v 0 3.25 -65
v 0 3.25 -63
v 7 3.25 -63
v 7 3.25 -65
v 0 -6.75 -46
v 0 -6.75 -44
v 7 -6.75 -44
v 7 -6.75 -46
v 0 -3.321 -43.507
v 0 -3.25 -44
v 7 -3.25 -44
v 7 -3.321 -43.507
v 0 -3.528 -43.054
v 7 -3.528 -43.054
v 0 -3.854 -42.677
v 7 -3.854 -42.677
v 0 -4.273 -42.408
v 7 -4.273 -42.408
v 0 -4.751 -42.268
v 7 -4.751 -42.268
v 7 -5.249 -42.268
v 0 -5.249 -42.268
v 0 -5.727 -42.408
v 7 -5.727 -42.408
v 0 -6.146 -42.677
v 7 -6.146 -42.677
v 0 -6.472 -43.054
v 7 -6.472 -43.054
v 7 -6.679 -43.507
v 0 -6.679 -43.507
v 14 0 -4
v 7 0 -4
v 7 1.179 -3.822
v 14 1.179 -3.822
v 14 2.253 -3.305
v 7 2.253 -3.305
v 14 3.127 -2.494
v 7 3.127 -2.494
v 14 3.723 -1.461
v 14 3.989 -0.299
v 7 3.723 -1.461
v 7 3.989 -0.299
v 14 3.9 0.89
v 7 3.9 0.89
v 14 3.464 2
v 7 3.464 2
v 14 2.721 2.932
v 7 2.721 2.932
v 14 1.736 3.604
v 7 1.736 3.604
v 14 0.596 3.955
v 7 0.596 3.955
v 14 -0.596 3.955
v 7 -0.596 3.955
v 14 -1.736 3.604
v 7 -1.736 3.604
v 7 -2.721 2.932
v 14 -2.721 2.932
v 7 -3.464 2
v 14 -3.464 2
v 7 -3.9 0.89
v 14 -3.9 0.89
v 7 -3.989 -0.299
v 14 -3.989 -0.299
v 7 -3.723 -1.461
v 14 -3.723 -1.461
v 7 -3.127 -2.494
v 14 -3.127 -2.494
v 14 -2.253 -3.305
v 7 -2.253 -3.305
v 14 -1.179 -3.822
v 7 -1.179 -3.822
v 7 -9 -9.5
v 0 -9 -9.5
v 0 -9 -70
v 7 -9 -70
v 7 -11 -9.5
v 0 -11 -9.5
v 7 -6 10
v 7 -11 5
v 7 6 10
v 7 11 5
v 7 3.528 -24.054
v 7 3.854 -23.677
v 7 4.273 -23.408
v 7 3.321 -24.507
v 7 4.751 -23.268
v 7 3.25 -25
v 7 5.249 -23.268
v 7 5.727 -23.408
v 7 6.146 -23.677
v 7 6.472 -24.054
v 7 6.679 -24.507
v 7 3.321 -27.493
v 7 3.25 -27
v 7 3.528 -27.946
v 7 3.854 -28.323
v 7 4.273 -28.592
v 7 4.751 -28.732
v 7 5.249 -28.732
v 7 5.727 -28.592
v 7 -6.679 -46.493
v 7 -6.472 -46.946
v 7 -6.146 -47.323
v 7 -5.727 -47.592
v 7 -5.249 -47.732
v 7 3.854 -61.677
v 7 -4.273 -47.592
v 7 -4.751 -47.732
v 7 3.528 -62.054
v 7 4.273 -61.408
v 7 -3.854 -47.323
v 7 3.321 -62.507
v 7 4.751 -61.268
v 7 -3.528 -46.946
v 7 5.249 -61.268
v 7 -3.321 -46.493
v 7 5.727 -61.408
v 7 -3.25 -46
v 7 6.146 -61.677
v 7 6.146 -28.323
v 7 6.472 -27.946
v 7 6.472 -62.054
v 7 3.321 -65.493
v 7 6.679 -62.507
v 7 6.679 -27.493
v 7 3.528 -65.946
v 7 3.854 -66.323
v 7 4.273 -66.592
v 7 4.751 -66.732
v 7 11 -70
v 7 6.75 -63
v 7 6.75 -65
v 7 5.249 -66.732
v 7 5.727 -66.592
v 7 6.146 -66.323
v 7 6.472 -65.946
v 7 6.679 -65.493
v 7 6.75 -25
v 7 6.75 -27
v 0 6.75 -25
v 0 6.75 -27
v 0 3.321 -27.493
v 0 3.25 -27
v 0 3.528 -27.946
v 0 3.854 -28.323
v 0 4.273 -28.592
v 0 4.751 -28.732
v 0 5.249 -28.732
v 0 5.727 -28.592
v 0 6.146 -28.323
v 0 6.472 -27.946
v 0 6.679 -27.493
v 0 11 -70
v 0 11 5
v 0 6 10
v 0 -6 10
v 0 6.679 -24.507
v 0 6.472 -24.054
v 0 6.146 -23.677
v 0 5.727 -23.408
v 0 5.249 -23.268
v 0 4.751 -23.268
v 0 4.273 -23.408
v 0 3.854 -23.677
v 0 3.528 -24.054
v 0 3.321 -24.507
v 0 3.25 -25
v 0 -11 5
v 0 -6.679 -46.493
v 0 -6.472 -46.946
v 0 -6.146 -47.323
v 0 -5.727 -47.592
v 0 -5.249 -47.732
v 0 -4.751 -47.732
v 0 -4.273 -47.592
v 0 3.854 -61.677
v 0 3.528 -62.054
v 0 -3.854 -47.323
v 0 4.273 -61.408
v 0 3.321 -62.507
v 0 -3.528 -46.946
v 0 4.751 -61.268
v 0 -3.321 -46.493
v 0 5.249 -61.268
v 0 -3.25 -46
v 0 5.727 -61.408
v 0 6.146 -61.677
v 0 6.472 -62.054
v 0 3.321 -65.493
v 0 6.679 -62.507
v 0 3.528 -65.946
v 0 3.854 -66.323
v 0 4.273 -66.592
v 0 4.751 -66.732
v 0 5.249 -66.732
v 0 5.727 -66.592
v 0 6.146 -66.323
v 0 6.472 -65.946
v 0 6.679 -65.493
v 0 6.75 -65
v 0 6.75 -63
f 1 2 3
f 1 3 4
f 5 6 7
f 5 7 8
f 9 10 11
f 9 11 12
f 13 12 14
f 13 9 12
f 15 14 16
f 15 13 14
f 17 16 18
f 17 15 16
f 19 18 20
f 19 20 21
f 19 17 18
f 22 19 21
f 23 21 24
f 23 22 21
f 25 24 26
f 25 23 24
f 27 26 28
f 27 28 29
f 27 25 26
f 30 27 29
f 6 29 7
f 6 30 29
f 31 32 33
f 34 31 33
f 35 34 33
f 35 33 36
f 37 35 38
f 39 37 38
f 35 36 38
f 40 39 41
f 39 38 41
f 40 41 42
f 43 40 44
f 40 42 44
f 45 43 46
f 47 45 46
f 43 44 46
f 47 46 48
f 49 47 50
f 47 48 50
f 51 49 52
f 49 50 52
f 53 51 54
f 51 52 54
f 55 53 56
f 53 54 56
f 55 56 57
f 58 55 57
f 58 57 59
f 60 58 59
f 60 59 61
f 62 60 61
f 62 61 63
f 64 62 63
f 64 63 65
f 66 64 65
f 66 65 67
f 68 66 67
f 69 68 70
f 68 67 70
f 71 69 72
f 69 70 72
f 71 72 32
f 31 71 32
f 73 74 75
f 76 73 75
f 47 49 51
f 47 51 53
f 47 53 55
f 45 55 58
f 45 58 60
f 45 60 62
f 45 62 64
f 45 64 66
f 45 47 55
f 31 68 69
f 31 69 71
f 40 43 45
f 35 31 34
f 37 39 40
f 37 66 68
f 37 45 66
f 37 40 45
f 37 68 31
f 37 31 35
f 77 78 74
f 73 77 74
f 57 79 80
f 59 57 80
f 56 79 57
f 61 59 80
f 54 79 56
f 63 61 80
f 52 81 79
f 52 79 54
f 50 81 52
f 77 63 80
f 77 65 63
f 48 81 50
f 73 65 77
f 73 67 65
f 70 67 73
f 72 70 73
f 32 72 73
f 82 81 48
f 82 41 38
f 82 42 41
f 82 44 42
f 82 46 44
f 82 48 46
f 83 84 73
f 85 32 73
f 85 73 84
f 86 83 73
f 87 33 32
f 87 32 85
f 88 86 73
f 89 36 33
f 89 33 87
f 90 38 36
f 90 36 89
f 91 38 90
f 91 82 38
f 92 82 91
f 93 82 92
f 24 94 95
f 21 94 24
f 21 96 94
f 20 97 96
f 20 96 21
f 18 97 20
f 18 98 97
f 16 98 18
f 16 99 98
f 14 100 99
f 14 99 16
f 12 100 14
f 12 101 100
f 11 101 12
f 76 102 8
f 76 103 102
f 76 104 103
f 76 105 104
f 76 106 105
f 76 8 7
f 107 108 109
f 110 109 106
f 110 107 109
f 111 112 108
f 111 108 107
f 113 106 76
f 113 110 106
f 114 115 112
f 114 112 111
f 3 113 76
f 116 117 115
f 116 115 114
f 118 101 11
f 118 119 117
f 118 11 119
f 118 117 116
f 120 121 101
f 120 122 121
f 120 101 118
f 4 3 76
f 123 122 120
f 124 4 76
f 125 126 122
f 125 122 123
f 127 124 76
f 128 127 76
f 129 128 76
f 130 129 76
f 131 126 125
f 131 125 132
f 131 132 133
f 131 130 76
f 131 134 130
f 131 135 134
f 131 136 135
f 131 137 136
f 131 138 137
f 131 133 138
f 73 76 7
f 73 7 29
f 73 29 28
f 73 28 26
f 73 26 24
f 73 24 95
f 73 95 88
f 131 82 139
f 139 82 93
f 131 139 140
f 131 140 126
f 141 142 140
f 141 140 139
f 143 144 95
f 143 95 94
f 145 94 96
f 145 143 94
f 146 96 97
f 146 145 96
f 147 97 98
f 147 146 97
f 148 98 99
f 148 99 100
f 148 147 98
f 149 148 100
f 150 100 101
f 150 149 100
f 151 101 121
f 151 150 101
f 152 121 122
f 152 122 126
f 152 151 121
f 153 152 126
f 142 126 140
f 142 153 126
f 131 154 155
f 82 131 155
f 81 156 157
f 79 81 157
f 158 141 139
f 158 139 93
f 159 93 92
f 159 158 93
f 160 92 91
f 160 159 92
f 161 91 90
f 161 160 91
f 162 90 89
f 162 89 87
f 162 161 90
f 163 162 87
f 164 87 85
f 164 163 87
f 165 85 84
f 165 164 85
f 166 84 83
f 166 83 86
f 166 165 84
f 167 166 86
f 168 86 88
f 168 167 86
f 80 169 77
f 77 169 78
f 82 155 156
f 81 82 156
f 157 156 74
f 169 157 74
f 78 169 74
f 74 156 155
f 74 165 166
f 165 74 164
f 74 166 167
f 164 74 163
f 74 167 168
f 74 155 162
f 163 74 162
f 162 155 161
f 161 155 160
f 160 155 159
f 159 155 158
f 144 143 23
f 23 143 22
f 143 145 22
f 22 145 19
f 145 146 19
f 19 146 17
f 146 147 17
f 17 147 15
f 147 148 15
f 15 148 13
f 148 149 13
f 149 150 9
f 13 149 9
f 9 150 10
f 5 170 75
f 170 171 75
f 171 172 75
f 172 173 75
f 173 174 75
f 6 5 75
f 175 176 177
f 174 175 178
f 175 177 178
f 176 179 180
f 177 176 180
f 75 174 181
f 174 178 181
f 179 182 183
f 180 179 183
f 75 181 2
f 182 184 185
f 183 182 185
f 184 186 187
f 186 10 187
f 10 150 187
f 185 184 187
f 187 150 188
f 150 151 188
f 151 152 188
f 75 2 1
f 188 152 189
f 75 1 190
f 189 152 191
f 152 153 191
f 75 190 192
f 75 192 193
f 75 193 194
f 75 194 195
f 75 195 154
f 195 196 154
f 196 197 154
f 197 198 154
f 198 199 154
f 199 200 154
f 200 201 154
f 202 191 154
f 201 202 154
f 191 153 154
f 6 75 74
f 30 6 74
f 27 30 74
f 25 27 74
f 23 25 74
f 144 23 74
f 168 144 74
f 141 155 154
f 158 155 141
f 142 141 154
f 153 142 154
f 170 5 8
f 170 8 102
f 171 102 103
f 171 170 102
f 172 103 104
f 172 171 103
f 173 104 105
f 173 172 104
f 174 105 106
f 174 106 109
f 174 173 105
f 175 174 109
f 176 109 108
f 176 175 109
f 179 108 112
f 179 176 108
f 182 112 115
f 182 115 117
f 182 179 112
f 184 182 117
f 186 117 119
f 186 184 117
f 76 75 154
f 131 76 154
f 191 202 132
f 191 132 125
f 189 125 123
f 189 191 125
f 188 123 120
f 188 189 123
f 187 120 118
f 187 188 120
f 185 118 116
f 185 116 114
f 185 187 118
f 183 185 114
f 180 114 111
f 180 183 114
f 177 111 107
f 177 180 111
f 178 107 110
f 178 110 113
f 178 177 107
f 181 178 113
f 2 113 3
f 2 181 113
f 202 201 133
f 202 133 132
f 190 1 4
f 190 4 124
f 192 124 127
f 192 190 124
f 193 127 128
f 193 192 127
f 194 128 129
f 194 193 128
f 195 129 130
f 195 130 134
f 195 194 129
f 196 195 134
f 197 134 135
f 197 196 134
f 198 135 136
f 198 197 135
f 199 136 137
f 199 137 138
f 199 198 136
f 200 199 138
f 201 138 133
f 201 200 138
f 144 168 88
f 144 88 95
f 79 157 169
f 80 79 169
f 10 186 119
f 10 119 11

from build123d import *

# Parameters (mm, degrees)
SKETCH1_R           = 4
BOSS_EXTRUDE1_DEPTH = 7
BOSS_EXTRUDE2_START = 7
SKETCH1_4_R         = 4
BOSS_EXTRUDE2_DEPTH = 7


with BuildPart() as part:
    # Sketch1 → Boss-Extrude1 (new body)
    # profile 1 of 2: a face of its own
    with BuildSketch(Plane(origin=(0, 0, 0), x_dir=(0, 0, -1), z_dir=(1, 0, 0))):
        Polygon((-10, 6), (-10, -6), (-5, -11), (9.5, -11), (9.5, -9), (70, -9), (70, 11), (-5, 11), align=None)
        Circle(SKETCH1_R, mode=Mode.SUBTRACT)
        with BuildLine():
            ThreePointArc((63, 6.75), (61.25, 5), (63, 3.25))
            Line((63, 3.25), (65, 3.25))
            ThreePointArc((65, 3.25), (66.75, 5), (65, 6.75))
            Line((65, 6.75), (63, 6.75))
        make_face(mode=Mode.SUBTRACT)
        with BuildLine():
            ThreePointArc((46, -6.75), (47.75, -5), (46, -3.25))
            Line((46, -3.25), (44, -3.25))
            ThreePointArc((44, -3.25), (42.25, -5), (44, -6.75))
            Line((44, -6.75), (46, -6.75))
        make_face(mode=Mode.SUBTRACT)
        with BuildLine():
            ThreePointArc((27, 3.25), (28.75, 5), (27, 6.75))
            Line((27, 6.75), (25, 6.75))
            ThreePointArc((25, 6.75), (23.25, 5), (25, 3.25))
            Line((25, 3.25), (27, 3.25))
        make_face(mode=Mode.SUBTRACT)
    # profile 2 of 2: a face of its own
    with BuildSketch(Plane(origin=(0, 0, 0), x_dir=(0, 0, -1), z_dir=(1, 0, 0))):
        Circle(SKETCH1_R)
    extrude(amount=BOSS_EXTRUDE1_DEPTH)

    # Sketch1<4> → Boss-Extrude2 (add)
    with BuildSketch(Plane(origin=(0, 0, 0), x_dir=(0, 0, -1), z_dir=(1, 0, 0)).offset(BOSS_EXTRUDE2_START)):
        Circle(SKETCH1_4_R)
    extrude(amount=BOSS_EXTRUDE2_DEPTH)


solid = part.part
